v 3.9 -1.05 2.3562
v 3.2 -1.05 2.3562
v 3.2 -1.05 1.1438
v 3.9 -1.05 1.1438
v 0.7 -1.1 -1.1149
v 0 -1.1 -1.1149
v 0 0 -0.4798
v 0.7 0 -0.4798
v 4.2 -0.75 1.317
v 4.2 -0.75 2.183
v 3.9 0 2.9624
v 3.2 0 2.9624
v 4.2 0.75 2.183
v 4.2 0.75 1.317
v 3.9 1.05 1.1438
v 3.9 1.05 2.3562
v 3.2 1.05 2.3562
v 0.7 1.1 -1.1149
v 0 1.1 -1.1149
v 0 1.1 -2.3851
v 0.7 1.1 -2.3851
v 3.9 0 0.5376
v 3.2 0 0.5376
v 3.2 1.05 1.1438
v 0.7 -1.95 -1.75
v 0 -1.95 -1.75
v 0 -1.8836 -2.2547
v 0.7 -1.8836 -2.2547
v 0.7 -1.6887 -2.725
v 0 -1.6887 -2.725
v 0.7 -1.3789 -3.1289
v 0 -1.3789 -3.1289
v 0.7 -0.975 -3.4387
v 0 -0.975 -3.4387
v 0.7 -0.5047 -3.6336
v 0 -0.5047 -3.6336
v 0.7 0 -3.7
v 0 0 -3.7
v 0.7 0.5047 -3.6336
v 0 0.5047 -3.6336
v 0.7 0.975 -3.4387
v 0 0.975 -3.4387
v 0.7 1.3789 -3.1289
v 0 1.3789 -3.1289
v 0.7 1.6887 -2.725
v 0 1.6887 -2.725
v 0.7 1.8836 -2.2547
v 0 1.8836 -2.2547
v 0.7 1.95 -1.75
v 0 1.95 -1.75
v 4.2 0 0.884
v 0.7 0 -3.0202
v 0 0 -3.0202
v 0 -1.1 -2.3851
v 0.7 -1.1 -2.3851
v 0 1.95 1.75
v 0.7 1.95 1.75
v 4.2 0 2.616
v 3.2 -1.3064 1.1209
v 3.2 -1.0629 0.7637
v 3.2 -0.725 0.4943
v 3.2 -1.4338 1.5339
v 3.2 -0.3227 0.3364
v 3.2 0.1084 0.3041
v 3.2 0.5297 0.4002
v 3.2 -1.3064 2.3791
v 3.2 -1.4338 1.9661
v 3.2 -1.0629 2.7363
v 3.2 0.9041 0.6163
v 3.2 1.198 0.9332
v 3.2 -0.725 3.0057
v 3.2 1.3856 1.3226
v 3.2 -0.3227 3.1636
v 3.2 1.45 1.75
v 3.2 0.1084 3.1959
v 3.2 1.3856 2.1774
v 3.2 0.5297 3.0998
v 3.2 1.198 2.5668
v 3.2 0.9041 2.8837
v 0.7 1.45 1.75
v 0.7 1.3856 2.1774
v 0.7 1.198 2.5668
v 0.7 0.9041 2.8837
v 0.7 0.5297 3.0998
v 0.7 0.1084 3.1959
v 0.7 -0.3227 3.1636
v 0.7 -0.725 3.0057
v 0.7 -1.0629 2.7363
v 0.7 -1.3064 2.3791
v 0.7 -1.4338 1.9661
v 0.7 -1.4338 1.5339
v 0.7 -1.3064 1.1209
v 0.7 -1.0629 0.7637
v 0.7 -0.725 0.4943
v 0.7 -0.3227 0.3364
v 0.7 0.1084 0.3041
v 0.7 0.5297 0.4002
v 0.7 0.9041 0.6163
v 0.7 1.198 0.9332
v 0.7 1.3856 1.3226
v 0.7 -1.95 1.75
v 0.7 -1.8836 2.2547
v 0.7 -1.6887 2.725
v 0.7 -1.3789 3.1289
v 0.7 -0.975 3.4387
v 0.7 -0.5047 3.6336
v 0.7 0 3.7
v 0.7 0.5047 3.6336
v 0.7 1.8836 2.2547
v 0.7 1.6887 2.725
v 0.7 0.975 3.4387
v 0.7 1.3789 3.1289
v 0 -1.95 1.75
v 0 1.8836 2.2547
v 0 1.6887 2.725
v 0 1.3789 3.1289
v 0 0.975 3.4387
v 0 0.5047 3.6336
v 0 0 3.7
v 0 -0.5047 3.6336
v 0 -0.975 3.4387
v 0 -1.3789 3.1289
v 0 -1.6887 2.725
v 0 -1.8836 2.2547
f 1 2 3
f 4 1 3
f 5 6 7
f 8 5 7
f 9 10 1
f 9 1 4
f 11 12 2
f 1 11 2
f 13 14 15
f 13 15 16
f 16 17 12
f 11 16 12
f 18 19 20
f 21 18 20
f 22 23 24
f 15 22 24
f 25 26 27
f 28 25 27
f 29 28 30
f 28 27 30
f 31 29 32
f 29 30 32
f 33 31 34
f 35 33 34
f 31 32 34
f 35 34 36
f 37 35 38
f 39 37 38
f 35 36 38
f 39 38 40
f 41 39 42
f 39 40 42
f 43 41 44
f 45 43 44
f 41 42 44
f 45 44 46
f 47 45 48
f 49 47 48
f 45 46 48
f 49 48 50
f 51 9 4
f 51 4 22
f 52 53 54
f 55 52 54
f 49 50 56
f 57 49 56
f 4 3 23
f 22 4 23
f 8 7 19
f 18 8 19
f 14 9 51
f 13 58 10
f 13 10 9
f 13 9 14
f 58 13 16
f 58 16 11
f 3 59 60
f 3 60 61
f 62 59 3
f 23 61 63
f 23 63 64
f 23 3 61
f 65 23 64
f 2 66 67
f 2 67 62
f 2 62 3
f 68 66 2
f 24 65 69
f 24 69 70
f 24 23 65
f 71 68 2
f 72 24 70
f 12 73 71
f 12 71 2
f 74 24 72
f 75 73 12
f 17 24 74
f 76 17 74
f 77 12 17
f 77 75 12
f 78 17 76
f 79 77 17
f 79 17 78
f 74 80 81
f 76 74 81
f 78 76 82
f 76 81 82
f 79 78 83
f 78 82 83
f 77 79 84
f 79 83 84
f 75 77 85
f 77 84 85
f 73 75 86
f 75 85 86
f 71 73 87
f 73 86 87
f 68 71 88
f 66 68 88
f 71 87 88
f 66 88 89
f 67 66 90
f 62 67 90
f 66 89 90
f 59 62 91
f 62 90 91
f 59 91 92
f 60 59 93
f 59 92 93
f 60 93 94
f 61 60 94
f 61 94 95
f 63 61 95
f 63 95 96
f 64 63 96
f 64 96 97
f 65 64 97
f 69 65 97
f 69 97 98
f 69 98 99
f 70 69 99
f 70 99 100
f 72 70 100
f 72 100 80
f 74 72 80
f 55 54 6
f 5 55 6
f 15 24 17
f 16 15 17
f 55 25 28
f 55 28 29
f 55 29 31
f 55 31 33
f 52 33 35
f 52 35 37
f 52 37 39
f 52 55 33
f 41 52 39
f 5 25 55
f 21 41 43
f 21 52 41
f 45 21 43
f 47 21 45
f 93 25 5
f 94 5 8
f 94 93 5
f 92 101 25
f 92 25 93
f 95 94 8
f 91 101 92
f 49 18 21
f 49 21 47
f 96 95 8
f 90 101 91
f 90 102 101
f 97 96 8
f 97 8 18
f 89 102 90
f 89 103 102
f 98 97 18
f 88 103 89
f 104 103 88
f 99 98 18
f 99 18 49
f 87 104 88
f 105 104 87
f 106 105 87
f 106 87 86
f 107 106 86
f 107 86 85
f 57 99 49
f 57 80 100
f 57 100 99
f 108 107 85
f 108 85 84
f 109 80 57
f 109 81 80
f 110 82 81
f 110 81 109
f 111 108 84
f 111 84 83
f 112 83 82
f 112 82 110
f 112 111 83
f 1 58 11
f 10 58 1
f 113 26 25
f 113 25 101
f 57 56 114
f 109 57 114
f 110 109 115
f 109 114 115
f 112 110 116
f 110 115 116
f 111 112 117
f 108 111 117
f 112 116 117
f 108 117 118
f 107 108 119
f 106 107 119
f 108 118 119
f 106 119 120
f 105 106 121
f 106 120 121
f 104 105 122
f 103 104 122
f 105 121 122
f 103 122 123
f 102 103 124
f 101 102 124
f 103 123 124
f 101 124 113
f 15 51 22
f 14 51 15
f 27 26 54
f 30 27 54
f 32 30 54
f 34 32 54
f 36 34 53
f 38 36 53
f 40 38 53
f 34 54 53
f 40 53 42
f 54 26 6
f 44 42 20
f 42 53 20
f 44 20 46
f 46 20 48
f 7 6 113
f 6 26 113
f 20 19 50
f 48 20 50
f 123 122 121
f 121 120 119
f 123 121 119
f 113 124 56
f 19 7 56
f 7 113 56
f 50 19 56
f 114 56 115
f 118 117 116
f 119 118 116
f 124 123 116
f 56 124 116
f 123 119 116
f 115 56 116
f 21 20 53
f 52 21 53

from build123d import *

# Parameters (mm, degrees)
F0_W     = 3.9
F0_H     = 3.5
F1_DEPTH = 0.7
F2_R     = 1.45
F3_DEPTH = 3.2
F5_DEPTH = 1
F6_SIZE  = 0.3
F8_DEPTH = 0.7


with BuildPart() as f1:
    # F0 (on Right) → F1 (new body)
    with BuildSketch(Plane.YZ):
        Rectangle(F0_W, F0_H)
        with BuildLine():
            Line((-1.95, 1.75), (1.95, 1.75))
            ThreePointArc((1.95, 1.75), (0, 3.7), (-1.95, 1.75))
        make_face()
        with BuildLine():
            ThreePointArc((-1.95, -1.75), (0, -3.7), (1.95, -1.75))
            Line((1.95, -1.75), (-1.95, -1.75))
        make_face()
    extrude(amount=F1_DEPTH)

    # F2 (on Right) → F3 (join)
    with BuildSketch(Plane.YZ):
        with Locations((0, 1.75)):
            Circle(F2_R)
    extrude(amount=F3_DEPTH)

    # F4 (on face) → F5 (join)
    with BuildSketch(Plane.YZ.offset(3.2)):
        Polygon((1.05, 1.143782), (1.05, 2.356218), (0, 2.962436), (-1.05, 2.356218), (-1.05, 1.143782), (0, 0.537564), align=None)
    extrude(amount=F5_DEPTH)

    # F6
    f6_edges = [f1.edges().sort_by_distance(p)[0] for p in [
        (4.2, -0.525, 2.659327),
        (4.2, 0.525, 2.659327),
        (4.2, 1.05, 1.75),
        (4.2, 0.525, 0.840673),
        (4.2, -0.525, 0.840673),
        (4.2, -1.05, 1.75),
    ]]
    chamfer(f6_edges, length=F6_SIZE)

    # F7 (on face) → F8 (cut, through all)
    with BuildSketch(Plane(origin=(0, 0, 0), x_dir=(0, -1, 0), z_dir=(-1, 0, 0))):
        Polygon((1.1, -2.385085), (1.1, -1.114915), (0, -0.479829), (-1.1, -1.114915), (-1.1, -2.385085), (0, -3.020171), align=None)
    extrude(amount=-F8_DEPTH, mode=Mode.SUBTRACT)


solid = f1.part
